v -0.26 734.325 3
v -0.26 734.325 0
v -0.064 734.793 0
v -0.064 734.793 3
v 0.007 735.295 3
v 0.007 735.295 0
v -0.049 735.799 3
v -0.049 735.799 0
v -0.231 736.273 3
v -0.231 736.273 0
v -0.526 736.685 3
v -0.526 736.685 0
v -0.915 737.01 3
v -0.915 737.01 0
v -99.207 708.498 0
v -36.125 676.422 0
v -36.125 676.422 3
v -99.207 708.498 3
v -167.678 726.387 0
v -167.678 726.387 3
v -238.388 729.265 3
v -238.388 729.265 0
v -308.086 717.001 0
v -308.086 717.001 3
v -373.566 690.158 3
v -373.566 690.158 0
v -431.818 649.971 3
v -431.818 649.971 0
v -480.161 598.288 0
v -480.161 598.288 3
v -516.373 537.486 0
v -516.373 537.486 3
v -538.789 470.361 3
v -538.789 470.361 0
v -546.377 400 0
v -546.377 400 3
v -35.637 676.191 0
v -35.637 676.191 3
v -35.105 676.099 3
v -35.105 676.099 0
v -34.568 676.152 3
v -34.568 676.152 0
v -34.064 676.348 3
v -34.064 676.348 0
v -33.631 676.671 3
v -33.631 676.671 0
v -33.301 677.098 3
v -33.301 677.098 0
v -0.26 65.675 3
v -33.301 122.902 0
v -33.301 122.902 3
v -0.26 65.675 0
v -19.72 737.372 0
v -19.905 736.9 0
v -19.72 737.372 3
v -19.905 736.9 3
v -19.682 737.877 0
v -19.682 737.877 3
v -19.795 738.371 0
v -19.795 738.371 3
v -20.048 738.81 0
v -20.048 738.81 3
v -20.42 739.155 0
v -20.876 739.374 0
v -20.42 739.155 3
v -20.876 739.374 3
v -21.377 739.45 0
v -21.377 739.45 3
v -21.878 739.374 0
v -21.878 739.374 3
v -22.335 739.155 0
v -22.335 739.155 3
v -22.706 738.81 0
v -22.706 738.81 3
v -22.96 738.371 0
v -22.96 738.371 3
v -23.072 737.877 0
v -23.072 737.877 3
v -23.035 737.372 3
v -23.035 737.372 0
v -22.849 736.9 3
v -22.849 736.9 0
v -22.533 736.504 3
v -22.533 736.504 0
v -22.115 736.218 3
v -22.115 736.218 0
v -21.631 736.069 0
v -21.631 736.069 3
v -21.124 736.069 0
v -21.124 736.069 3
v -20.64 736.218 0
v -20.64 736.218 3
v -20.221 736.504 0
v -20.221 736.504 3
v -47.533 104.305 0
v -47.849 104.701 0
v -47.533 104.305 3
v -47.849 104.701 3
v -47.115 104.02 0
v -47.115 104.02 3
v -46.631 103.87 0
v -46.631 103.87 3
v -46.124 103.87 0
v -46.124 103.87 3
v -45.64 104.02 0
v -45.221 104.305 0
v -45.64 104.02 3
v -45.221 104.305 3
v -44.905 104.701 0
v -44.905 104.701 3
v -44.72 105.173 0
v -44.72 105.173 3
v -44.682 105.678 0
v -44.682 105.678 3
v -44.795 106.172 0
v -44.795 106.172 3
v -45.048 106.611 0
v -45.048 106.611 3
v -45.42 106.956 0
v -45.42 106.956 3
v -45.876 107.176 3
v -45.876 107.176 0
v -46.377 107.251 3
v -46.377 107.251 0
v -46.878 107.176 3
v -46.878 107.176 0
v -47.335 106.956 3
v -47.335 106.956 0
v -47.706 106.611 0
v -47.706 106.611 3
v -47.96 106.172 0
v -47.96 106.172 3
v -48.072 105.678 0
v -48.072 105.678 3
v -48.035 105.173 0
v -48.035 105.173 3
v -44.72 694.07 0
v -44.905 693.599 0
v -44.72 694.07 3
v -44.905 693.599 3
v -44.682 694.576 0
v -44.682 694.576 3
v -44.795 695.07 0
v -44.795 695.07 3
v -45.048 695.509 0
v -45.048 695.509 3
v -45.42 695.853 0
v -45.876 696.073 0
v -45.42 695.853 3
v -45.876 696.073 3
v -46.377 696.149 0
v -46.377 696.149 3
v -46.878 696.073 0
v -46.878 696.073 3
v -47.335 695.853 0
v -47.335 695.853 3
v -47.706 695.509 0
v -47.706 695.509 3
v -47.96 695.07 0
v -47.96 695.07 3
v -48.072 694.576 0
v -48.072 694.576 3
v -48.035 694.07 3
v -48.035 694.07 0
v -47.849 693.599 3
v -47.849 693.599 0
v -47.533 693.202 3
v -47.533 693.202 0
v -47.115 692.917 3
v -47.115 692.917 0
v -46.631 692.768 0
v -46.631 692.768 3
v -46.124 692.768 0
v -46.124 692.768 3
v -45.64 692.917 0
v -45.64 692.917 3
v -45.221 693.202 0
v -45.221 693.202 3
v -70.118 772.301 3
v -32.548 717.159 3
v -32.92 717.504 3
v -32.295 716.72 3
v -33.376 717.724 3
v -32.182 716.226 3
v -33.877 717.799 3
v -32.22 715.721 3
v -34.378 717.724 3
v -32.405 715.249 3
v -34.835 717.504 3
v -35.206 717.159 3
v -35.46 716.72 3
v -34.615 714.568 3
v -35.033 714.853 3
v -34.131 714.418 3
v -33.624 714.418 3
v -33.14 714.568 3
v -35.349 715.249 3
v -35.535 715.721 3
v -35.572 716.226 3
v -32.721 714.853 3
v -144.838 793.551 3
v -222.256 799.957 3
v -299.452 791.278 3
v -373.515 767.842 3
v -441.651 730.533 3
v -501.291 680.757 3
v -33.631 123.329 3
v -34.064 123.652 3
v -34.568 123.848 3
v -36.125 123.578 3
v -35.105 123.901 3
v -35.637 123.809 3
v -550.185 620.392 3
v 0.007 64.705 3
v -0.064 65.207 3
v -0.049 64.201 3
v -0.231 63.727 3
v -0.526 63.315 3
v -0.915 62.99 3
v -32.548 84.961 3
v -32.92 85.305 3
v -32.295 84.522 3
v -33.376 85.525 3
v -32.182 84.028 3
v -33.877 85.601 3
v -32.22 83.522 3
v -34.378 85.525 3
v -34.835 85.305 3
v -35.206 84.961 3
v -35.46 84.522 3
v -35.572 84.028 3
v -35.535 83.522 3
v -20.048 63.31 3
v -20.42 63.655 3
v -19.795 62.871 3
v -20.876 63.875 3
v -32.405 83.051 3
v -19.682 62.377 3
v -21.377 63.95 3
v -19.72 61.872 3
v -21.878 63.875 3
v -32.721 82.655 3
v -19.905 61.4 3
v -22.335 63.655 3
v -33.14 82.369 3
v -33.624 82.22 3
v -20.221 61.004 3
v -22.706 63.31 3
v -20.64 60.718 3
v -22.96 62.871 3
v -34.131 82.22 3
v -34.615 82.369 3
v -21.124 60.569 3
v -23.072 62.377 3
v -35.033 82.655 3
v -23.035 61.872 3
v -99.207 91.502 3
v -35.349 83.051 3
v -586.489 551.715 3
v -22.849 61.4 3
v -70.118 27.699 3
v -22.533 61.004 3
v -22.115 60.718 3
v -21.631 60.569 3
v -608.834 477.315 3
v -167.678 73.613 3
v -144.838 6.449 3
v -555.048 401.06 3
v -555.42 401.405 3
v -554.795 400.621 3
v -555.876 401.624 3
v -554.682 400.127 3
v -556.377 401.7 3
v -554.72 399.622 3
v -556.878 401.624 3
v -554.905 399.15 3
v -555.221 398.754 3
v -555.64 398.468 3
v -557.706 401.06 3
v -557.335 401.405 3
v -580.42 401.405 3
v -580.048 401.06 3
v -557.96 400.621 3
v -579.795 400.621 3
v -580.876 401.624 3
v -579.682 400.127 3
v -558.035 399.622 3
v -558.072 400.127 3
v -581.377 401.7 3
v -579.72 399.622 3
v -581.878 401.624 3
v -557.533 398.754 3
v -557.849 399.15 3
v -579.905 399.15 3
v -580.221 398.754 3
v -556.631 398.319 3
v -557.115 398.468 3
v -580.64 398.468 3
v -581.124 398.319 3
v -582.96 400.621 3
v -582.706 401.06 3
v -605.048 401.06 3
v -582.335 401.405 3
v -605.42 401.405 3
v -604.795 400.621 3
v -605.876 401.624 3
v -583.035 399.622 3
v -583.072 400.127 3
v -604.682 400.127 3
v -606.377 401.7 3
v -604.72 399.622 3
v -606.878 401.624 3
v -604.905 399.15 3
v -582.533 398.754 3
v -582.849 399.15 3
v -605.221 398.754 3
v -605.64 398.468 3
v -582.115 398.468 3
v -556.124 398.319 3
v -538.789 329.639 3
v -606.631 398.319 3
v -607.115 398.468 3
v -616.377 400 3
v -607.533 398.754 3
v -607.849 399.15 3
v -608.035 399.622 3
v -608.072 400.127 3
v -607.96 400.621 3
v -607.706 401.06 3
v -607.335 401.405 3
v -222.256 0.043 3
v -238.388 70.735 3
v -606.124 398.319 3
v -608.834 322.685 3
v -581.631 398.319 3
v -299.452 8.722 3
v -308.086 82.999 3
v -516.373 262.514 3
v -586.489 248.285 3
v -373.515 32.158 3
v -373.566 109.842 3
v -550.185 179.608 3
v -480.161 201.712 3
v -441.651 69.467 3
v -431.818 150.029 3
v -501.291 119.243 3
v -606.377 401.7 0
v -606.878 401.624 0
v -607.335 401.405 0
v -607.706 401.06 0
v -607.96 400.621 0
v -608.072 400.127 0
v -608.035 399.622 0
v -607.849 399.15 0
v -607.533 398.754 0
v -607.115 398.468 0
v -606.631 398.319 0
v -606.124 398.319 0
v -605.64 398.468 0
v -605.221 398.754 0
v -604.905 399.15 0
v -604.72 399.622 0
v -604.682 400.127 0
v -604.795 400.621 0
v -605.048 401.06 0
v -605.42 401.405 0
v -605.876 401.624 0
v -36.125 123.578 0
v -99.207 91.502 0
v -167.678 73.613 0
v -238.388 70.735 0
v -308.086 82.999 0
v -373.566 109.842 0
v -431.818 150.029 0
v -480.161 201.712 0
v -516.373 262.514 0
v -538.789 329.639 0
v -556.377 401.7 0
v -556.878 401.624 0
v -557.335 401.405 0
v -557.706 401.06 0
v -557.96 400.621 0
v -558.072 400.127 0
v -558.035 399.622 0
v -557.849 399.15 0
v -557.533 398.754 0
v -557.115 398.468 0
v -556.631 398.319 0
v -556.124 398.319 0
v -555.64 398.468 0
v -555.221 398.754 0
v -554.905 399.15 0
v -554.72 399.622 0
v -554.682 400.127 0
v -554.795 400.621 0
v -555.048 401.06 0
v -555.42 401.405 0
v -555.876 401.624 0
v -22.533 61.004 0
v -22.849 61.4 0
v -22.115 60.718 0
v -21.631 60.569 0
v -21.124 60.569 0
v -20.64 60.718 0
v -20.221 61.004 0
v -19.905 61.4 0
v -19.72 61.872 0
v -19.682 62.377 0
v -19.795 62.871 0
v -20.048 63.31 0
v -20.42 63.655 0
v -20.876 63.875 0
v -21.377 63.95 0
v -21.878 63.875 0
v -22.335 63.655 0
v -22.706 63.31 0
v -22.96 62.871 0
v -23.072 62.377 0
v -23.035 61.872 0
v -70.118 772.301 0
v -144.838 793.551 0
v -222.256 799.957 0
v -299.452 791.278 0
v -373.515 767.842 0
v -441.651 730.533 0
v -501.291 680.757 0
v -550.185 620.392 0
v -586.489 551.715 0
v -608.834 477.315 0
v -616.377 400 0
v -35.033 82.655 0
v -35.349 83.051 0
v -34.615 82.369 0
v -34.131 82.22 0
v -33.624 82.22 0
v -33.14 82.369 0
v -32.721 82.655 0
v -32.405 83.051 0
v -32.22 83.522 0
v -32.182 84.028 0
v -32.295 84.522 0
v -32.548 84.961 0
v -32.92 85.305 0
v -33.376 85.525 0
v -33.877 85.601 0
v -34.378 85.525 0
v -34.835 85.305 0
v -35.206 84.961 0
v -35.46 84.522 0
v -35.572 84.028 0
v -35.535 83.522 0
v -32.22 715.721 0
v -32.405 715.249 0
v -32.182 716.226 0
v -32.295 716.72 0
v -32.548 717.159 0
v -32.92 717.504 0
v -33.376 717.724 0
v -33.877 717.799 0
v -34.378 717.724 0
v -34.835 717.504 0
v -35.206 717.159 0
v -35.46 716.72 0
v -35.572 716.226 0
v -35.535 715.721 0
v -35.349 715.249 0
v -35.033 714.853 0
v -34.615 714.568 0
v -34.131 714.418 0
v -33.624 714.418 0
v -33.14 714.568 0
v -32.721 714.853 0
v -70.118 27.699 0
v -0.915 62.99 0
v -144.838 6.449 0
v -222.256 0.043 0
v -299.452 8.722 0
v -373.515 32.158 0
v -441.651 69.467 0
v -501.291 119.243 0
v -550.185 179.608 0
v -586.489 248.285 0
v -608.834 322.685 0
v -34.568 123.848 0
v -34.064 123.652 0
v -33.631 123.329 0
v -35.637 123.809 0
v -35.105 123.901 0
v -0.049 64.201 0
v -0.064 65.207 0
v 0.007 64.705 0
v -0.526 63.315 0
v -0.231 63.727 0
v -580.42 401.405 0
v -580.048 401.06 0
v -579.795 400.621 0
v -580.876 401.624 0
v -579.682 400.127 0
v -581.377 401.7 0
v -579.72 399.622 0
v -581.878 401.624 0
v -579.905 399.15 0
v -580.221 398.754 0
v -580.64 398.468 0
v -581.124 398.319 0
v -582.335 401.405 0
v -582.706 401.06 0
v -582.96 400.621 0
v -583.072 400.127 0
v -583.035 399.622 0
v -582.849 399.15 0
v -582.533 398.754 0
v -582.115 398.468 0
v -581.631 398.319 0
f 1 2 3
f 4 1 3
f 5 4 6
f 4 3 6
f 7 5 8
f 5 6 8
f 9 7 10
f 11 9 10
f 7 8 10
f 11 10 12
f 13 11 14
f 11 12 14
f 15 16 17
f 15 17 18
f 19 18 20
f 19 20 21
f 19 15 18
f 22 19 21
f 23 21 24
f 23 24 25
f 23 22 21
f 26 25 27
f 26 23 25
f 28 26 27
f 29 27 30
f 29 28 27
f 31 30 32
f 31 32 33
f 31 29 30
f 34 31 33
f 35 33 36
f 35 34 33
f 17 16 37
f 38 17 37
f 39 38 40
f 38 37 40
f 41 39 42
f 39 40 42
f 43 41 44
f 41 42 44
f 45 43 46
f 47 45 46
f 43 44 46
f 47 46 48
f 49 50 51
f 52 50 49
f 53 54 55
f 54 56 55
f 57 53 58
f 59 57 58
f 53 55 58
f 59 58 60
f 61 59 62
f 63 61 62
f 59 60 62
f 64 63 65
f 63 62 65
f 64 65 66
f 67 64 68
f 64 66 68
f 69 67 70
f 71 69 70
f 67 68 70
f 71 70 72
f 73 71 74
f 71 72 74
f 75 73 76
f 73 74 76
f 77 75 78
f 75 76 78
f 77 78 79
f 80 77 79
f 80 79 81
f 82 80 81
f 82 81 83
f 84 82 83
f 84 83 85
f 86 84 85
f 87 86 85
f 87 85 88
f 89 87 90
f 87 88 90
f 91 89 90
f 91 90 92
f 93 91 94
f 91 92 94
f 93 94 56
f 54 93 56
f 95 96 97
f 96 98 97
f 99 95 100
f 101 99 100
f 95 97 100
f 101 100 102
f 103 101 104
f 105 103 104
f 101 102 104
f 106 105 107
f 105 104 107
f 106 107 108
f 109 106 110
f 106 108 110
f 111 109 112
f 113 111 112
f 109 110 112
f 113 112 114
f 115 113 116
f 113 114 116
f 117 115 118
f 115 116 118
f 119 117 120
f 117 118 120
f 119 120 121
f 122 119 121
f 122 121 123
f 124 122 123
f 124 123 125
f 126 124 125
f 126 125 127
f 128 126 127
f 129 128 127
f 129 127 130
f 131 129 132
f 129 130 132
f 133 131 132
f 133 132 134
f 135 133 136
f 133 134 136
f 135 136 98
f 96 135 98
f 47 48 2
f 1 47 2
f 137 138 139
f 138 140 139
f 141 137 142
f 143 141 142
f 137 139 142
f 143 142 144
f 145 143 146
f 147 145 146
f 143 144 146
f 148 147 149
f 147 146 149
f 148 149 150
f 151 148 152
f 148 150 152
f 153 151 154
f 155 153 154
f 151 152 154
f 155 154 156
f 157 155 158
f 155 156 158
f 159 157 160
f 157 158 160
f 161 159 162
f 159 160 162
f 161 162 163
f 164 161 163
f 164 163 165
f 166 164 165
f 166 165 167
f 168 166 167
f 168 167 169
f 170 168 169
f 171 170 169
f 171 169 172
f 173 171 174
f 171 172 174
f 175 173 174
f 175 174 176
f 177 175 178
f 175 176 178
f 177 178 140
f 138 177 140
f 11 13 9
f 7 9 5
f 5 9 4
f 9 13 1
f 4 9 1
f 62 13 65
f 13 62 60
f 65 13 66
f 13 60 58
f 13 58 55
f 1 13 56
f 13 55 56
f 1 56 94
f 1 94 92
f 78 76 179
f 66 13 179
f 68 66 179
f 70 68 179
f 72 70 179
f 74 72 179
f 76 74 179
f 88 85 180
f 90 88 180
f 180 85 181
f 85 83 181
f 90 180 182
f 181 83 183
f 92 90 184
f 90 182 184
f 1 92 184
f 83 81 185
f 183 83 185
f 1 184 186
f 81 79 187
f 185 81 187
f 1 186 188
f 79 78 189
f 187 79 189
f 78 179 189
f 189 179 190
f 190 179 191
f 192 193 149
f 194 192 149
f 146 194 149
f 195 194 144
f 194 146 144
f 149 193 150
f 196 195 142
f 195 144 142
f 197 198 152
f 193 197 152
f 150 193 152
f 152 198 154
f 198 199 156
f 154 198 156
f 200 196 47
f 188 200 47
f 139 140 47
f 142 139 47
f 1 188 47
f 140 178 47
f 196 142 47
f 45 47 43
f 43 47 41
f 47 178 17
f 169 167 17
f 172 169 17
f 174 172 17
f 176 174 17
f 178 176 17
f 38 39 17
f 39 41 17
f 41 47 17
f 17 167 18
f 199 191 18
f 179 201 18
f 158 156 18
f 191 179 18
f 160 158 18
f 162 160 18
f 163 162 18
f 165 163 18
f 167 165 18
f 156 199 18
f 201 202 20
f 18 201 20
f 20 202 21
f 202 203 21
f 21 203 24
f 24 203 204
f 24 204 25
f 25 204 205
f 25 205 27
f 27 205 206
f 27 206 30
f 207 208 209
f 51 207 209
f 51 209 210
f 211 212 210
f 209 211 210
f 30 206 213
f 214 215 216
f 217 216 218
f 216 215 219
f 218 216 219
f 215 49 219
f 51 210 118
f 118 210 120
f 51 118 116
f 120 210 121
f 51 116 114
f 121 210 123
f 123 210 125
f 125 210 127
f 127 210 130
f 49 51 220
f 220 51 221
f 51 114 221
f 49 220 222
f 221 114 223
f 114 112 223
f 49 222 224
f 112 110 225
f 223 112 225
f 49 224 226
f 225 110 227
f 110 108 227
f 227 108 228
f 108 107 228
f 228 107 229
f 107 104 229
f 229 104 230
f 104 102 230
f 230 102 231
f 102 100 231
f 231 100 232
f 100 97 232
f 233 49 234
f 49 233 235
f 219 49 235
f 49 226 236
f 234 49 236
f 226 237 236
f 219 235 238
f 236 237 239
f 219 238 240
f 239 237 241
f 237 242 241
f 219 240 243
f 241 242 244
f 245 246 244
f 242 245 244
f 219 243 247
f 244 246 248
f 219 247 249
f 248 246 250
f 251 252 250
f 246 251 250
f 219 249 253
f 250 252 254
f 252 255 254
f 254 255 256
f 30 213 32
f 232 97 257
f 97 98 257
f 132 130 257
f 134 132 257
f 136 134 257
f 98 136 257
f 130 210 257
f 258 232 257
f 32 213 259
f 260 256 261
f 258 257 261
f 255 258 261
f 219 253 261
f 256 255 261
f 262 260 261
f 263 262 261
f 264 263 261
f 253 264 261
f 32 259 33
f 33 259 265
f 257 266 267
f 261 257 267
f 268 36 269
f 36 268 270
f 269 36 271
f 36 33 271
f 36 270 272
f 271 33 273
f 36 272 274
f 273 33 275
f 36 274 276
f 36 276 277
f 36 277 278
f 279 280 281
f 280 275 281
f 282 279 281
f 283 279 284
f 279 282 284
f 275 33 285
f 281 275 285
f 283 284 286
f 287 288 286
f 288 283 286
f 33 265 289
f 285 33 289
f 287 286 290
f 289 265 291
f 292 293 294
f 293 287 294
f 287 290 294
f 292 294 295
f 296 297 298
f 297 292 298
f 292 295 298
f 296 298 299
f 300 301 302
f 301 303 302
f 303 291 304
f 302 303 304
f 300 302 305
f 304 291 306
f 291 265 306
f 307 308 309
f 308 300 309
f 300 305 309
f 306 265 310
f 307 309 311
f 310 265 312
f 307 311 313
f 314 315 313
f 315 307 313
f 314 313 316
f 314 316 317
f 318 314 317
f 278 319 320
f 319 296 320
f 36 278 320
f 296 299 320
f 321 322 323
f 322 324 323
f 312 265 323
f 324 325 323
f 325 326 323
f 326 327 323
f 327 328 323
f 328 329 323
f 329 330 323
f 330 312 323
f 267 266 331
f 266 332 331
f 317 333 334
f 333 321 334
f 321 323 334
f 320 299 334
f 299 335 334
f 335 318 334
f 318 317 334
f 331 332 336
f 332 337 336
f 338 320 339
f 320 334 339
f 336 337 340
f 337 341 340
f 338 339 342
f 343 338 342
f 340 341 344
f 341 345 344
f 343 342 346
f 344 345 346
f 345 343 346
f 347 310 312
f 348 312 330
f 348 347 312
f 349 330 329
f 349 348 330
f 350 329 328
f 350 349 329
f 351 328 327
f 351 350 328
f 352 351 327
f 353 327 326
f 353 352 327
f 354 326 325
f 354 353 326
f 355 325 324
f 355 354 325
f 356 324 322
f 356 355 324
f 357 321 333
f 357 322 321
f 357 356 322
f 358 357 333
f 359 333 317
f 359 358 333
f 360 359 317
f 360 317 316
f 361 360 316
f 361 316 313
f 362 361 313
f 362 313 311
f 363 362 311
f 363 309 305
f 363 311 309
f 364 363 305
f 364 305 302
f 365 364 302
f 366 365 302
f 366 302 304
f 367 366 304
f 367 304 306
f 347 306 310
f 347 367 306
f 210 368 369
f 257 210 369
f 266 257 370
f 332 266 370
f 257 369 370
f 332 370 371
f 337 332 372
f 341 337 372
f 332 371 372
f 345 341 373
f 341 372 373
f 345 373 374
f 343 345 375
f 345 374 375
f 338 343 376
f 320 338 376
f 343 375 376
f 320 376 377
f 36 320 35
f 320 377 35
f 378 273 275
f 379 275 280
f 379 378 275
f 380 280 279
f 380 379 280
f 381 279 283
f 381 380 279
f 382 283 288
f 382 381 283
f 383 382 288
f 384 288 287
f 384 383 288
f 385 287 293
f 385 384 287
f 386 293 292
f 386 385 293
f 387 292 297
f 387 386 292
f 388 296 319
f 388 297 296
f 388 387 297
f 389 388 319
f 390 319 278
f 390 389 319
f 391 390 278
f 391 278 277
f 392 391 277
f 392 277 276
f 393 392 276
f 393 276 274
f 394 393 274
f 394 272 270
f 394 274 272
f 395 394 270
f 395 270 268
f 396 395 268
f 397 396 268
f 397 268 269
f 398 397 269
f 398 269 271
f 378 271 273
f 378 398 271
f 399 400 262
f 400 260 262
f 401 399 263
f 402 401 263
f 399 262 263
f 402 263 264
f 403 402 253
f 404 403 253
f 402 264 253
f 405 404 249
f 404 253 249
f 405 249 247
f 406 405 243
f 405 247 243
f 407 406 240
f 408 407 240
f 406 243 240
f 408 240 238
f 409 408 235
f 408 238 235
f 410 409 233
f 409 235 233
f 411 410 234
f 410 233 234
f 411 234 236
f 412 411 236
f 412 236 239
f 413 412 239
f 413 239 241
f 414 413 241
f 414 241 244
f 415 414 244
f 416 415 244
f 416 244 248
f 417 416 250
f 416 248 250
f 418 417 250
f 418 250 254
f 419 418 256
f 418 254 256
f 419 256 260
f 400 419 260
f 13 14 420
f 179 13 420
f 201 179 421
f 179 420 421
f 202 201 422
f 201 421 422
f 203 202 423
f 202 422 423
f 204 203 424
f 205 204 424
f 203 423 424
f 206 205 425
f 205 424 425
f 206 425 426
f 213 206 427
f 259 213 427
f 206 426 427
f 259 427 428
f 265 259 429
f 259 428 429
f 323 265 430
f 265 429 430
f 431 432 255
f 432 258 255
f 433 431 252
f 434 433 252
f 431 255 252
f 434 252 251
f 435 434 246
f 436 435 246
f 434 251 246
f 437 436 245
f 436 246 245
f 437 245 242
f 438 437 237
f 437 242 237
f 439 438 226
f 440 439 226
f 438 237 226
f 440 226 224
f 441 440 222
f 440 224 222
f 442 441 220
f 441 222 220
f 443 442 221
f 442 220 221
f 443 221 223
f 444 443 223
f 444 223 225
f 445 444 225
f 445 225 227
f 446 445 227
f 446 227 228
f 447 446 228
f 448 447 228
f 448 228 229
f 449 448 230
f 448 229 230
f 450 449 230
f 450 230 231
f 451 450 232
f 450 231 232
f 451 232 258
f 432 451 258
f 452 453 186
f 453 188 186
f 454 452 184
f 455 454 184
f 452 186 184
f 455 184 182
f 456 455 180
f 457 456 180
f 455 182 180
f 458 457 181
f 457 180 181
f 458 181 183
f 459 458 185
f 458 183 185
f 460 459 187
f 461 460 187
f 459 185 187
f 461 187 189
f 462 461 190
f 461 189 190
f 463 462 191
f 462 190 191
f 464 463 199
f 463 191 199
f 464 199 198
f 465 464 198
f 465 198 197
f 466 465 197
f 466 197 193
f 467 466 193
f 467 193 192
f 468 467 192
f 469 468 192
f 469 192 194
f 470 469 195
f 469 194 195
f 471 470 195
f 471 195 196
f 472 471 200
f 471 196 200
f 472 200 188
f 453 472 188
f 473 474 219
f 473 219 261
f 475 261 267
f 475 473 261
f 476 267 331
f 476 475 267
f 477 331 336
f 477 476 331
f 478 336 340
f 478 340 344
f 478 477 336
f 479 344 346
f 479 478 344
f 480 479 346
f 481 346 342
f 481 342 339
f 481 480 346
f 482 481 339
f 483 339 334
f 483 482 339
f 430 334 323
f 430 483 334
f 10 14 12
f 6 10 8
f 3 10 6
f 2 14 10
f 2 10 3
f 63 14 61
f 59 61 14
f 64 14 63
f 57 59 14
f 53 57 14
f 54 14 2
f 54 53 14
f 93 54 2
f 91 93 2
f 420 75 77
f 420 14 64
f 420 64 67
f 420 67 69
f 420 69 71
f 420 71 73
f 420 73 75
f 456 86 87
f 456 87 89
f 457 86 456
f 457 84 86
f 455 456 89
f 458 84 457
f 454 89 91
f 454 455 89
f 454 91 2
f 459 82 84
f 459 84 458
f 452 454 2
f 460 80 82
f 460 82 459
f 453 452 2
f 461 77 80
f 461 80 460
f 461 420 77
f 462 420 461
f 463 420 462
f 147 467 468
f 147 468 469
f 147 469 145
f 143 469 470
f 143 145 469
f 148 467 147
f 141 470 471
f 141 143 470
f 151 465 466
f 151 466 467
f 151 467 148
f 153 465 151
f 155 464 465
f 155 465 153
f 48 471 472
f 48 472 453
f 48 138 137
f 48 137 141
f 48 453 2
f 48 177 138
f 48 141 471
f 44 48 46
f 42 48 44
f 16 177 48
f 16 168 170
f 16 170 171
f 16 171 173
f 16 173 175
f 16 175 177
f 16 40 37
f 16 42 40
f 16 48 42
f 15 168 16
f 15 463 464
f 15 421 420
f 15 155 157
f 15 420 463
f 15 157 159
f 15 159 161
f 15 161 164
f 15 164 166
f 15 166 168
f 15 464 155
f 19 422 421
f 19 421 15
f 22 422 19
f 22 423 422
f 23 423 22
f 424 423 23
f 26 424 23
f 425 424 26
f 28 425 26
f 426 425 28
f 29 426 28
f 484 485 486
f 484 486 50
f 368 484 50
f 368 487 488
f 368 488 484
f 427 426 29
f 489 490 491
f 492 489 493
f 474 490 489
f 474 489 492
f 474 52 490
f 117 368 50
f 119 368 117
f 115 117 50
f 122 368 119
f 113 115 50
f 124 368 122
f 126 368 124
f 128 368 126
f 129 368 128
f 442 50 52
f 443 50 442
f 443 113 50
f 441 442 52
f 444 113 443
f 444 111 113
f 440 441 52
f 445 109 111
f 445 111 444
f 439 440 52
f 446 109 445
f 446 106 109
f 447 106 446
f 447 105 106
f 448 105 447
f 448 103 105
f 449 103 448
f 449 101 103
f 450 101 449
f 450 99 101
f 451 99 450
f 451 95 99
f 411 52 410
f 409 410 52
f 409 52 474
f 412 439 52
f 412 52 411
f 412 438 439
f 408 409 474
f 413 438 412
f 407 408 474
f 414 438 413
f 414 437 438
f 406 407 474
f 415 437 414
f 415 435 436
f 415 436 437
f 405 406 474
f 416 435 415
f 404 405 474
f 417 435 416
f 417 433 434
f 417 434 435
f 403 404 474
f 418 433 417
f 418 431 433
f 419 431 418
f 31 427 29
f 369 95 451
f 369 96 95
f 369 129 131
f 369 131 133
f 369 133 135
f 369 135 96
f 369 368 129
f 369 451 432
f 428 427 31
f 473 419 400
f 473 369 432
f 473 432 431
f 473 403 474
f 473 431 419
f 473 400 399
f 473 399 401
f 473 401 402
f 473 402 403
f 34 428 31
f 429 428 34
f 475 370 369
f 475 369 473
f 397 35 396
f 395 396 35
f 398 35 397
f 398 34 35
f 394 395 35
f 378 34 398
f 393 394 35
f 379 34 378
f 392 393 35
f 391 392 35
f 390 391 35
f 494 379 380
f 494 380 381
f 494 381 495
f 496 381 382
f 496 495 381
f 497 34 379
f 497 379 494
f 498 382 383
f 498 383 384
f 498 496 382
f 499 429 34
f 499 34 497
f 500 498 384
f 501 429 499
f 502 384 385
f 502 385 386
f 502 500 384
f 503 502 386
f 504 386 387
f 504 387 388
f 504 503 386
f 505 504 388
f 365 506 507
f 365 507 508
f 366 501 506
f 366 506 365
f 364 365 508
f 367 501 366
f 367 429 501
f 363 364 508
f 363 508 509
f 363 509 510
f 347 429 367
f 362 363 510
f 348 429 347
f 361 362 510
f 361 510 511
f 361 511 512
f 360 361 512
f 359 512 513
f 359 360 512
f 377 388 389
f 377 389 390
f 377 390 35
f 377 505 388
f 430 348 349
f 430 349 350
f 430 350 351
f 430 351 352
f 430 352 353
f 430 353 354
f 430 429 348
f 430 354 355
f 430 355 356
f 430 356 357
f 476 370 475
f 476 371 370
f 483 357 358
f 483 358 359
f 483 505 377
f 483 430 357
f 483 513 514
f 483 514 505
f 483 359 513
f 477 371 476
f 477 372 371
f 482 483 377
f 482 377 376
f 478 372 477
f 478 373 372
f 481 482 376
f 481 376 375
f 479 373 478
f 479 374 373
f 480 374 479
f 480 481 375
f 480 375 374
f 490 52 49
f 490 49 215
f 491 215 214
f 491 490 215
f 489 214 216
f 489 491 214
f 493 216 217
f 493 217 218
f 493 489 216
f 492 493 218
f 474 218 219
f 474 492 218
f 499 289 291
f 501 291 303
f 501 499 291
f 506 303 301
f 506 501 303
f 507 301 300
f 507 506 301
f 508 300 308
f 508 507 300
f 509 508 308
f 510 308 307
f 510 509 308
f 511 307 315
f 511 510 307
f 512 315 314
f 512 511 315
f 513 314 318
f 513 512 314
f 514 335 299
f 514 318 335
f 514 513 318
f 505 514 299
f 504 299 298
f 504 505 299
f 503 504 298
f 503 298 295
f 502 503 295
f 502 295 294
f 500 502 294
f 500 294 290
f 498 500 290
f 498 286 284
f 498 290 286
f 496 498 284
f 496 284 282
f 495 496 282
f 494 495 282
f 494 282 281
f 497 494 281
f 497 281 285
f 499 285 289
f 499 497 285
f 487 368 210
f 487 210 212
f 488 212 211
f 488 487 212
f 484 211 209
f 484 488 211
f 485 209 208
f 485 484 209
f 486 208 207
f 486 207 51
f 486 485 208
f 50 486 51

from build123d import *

# Parameters (mm, degrees)
PAD015_DEPTH             = 3
SKETCH096_R              = 1.7
POCKET062_DEPTH          = 2019.841851
POCKET062_DEPTH_BACK     = 2022.841851
POLARPATTERN017_COUNT    = 3
CLONE004_PLACEMENT_ANGLE = 90


with BuildPart() as part:
    # Sketch095 → Pad015 (new body)
    with BuildSketch(Plane.XY):
        with BuildLine():
            ThreePointArc((337.01048, -215.462146), (350.845307, 192.113432), (0, 400))
            Line((0, 330), (0, 400))
            ThreePointArc((276.422258, -180.251866), (290.157816, 157.189192), (0, 330))
            ThreePointArc((276.422258, -180.251866), (276.152366, -181.809361), (277.097544, -183.076353))
            Line((277.097544, -183.076353), (334.325427, -216.116886))
            ThreePointArc((334.325427, -216.116886), (335.799237, -216.327901), (337.01048, -215.462146))
        make_face()
    pad015 = extrude(amount=PAD015_DEPTH)

    # Mirrored026: Pad015 across Sketch095 V_Axis
    add(pad015.mirror(Plane(origin=(0, 0, 0), x_dir=(0, 0, 1), z_dir=(1, 0, 0))))

    # Sketch096 → Pocket062 (cut, two sides)
    with BuildSketch(Plane(origin=(0, 330, 0), x_dir=(1, 0, 0), z_dir=(0, 0, 1))) as pocket062_sk:
        with Locations((0, 10)):
            Circle(SKETCH096_R)
        with Locations((0, 35)):
            Circle(SKETCH096_R)
        with Locations((0, 60)):
            Circle(SKETCH096_R)
    pocket062 = extrude(amount=-POCKET062_DEPTH, mode=Mode.SUBTRACT) + extrude(pocket062_sk.sketch, amount=POCKET062_DEPTH_BACK, mode=Mode.SUBTRACT)

    # PolarPattern017: Pocket062 ×3 about axis
    polarpattern017_axis = Axis((0, 0, 0), (0, 0, 1))
    for i in range(1, POLARPATTERN017_COUNT):
        add(pocket062.rotate(polarpattern017_axis, i * 360 / POLARPATTERN017_COUNT), mode=Mode.SUBTRACT)


with BuildPart() as part_1:
    # Clone004 placement: moved
    add(part.part.moved(Location((-216.377145, 400, 0))).rotate(Axis((-216.377145, 400, 0), (0, 0, 1)), CLONE004_PLACEMENT_ANGLE))


solid = part_1.part
